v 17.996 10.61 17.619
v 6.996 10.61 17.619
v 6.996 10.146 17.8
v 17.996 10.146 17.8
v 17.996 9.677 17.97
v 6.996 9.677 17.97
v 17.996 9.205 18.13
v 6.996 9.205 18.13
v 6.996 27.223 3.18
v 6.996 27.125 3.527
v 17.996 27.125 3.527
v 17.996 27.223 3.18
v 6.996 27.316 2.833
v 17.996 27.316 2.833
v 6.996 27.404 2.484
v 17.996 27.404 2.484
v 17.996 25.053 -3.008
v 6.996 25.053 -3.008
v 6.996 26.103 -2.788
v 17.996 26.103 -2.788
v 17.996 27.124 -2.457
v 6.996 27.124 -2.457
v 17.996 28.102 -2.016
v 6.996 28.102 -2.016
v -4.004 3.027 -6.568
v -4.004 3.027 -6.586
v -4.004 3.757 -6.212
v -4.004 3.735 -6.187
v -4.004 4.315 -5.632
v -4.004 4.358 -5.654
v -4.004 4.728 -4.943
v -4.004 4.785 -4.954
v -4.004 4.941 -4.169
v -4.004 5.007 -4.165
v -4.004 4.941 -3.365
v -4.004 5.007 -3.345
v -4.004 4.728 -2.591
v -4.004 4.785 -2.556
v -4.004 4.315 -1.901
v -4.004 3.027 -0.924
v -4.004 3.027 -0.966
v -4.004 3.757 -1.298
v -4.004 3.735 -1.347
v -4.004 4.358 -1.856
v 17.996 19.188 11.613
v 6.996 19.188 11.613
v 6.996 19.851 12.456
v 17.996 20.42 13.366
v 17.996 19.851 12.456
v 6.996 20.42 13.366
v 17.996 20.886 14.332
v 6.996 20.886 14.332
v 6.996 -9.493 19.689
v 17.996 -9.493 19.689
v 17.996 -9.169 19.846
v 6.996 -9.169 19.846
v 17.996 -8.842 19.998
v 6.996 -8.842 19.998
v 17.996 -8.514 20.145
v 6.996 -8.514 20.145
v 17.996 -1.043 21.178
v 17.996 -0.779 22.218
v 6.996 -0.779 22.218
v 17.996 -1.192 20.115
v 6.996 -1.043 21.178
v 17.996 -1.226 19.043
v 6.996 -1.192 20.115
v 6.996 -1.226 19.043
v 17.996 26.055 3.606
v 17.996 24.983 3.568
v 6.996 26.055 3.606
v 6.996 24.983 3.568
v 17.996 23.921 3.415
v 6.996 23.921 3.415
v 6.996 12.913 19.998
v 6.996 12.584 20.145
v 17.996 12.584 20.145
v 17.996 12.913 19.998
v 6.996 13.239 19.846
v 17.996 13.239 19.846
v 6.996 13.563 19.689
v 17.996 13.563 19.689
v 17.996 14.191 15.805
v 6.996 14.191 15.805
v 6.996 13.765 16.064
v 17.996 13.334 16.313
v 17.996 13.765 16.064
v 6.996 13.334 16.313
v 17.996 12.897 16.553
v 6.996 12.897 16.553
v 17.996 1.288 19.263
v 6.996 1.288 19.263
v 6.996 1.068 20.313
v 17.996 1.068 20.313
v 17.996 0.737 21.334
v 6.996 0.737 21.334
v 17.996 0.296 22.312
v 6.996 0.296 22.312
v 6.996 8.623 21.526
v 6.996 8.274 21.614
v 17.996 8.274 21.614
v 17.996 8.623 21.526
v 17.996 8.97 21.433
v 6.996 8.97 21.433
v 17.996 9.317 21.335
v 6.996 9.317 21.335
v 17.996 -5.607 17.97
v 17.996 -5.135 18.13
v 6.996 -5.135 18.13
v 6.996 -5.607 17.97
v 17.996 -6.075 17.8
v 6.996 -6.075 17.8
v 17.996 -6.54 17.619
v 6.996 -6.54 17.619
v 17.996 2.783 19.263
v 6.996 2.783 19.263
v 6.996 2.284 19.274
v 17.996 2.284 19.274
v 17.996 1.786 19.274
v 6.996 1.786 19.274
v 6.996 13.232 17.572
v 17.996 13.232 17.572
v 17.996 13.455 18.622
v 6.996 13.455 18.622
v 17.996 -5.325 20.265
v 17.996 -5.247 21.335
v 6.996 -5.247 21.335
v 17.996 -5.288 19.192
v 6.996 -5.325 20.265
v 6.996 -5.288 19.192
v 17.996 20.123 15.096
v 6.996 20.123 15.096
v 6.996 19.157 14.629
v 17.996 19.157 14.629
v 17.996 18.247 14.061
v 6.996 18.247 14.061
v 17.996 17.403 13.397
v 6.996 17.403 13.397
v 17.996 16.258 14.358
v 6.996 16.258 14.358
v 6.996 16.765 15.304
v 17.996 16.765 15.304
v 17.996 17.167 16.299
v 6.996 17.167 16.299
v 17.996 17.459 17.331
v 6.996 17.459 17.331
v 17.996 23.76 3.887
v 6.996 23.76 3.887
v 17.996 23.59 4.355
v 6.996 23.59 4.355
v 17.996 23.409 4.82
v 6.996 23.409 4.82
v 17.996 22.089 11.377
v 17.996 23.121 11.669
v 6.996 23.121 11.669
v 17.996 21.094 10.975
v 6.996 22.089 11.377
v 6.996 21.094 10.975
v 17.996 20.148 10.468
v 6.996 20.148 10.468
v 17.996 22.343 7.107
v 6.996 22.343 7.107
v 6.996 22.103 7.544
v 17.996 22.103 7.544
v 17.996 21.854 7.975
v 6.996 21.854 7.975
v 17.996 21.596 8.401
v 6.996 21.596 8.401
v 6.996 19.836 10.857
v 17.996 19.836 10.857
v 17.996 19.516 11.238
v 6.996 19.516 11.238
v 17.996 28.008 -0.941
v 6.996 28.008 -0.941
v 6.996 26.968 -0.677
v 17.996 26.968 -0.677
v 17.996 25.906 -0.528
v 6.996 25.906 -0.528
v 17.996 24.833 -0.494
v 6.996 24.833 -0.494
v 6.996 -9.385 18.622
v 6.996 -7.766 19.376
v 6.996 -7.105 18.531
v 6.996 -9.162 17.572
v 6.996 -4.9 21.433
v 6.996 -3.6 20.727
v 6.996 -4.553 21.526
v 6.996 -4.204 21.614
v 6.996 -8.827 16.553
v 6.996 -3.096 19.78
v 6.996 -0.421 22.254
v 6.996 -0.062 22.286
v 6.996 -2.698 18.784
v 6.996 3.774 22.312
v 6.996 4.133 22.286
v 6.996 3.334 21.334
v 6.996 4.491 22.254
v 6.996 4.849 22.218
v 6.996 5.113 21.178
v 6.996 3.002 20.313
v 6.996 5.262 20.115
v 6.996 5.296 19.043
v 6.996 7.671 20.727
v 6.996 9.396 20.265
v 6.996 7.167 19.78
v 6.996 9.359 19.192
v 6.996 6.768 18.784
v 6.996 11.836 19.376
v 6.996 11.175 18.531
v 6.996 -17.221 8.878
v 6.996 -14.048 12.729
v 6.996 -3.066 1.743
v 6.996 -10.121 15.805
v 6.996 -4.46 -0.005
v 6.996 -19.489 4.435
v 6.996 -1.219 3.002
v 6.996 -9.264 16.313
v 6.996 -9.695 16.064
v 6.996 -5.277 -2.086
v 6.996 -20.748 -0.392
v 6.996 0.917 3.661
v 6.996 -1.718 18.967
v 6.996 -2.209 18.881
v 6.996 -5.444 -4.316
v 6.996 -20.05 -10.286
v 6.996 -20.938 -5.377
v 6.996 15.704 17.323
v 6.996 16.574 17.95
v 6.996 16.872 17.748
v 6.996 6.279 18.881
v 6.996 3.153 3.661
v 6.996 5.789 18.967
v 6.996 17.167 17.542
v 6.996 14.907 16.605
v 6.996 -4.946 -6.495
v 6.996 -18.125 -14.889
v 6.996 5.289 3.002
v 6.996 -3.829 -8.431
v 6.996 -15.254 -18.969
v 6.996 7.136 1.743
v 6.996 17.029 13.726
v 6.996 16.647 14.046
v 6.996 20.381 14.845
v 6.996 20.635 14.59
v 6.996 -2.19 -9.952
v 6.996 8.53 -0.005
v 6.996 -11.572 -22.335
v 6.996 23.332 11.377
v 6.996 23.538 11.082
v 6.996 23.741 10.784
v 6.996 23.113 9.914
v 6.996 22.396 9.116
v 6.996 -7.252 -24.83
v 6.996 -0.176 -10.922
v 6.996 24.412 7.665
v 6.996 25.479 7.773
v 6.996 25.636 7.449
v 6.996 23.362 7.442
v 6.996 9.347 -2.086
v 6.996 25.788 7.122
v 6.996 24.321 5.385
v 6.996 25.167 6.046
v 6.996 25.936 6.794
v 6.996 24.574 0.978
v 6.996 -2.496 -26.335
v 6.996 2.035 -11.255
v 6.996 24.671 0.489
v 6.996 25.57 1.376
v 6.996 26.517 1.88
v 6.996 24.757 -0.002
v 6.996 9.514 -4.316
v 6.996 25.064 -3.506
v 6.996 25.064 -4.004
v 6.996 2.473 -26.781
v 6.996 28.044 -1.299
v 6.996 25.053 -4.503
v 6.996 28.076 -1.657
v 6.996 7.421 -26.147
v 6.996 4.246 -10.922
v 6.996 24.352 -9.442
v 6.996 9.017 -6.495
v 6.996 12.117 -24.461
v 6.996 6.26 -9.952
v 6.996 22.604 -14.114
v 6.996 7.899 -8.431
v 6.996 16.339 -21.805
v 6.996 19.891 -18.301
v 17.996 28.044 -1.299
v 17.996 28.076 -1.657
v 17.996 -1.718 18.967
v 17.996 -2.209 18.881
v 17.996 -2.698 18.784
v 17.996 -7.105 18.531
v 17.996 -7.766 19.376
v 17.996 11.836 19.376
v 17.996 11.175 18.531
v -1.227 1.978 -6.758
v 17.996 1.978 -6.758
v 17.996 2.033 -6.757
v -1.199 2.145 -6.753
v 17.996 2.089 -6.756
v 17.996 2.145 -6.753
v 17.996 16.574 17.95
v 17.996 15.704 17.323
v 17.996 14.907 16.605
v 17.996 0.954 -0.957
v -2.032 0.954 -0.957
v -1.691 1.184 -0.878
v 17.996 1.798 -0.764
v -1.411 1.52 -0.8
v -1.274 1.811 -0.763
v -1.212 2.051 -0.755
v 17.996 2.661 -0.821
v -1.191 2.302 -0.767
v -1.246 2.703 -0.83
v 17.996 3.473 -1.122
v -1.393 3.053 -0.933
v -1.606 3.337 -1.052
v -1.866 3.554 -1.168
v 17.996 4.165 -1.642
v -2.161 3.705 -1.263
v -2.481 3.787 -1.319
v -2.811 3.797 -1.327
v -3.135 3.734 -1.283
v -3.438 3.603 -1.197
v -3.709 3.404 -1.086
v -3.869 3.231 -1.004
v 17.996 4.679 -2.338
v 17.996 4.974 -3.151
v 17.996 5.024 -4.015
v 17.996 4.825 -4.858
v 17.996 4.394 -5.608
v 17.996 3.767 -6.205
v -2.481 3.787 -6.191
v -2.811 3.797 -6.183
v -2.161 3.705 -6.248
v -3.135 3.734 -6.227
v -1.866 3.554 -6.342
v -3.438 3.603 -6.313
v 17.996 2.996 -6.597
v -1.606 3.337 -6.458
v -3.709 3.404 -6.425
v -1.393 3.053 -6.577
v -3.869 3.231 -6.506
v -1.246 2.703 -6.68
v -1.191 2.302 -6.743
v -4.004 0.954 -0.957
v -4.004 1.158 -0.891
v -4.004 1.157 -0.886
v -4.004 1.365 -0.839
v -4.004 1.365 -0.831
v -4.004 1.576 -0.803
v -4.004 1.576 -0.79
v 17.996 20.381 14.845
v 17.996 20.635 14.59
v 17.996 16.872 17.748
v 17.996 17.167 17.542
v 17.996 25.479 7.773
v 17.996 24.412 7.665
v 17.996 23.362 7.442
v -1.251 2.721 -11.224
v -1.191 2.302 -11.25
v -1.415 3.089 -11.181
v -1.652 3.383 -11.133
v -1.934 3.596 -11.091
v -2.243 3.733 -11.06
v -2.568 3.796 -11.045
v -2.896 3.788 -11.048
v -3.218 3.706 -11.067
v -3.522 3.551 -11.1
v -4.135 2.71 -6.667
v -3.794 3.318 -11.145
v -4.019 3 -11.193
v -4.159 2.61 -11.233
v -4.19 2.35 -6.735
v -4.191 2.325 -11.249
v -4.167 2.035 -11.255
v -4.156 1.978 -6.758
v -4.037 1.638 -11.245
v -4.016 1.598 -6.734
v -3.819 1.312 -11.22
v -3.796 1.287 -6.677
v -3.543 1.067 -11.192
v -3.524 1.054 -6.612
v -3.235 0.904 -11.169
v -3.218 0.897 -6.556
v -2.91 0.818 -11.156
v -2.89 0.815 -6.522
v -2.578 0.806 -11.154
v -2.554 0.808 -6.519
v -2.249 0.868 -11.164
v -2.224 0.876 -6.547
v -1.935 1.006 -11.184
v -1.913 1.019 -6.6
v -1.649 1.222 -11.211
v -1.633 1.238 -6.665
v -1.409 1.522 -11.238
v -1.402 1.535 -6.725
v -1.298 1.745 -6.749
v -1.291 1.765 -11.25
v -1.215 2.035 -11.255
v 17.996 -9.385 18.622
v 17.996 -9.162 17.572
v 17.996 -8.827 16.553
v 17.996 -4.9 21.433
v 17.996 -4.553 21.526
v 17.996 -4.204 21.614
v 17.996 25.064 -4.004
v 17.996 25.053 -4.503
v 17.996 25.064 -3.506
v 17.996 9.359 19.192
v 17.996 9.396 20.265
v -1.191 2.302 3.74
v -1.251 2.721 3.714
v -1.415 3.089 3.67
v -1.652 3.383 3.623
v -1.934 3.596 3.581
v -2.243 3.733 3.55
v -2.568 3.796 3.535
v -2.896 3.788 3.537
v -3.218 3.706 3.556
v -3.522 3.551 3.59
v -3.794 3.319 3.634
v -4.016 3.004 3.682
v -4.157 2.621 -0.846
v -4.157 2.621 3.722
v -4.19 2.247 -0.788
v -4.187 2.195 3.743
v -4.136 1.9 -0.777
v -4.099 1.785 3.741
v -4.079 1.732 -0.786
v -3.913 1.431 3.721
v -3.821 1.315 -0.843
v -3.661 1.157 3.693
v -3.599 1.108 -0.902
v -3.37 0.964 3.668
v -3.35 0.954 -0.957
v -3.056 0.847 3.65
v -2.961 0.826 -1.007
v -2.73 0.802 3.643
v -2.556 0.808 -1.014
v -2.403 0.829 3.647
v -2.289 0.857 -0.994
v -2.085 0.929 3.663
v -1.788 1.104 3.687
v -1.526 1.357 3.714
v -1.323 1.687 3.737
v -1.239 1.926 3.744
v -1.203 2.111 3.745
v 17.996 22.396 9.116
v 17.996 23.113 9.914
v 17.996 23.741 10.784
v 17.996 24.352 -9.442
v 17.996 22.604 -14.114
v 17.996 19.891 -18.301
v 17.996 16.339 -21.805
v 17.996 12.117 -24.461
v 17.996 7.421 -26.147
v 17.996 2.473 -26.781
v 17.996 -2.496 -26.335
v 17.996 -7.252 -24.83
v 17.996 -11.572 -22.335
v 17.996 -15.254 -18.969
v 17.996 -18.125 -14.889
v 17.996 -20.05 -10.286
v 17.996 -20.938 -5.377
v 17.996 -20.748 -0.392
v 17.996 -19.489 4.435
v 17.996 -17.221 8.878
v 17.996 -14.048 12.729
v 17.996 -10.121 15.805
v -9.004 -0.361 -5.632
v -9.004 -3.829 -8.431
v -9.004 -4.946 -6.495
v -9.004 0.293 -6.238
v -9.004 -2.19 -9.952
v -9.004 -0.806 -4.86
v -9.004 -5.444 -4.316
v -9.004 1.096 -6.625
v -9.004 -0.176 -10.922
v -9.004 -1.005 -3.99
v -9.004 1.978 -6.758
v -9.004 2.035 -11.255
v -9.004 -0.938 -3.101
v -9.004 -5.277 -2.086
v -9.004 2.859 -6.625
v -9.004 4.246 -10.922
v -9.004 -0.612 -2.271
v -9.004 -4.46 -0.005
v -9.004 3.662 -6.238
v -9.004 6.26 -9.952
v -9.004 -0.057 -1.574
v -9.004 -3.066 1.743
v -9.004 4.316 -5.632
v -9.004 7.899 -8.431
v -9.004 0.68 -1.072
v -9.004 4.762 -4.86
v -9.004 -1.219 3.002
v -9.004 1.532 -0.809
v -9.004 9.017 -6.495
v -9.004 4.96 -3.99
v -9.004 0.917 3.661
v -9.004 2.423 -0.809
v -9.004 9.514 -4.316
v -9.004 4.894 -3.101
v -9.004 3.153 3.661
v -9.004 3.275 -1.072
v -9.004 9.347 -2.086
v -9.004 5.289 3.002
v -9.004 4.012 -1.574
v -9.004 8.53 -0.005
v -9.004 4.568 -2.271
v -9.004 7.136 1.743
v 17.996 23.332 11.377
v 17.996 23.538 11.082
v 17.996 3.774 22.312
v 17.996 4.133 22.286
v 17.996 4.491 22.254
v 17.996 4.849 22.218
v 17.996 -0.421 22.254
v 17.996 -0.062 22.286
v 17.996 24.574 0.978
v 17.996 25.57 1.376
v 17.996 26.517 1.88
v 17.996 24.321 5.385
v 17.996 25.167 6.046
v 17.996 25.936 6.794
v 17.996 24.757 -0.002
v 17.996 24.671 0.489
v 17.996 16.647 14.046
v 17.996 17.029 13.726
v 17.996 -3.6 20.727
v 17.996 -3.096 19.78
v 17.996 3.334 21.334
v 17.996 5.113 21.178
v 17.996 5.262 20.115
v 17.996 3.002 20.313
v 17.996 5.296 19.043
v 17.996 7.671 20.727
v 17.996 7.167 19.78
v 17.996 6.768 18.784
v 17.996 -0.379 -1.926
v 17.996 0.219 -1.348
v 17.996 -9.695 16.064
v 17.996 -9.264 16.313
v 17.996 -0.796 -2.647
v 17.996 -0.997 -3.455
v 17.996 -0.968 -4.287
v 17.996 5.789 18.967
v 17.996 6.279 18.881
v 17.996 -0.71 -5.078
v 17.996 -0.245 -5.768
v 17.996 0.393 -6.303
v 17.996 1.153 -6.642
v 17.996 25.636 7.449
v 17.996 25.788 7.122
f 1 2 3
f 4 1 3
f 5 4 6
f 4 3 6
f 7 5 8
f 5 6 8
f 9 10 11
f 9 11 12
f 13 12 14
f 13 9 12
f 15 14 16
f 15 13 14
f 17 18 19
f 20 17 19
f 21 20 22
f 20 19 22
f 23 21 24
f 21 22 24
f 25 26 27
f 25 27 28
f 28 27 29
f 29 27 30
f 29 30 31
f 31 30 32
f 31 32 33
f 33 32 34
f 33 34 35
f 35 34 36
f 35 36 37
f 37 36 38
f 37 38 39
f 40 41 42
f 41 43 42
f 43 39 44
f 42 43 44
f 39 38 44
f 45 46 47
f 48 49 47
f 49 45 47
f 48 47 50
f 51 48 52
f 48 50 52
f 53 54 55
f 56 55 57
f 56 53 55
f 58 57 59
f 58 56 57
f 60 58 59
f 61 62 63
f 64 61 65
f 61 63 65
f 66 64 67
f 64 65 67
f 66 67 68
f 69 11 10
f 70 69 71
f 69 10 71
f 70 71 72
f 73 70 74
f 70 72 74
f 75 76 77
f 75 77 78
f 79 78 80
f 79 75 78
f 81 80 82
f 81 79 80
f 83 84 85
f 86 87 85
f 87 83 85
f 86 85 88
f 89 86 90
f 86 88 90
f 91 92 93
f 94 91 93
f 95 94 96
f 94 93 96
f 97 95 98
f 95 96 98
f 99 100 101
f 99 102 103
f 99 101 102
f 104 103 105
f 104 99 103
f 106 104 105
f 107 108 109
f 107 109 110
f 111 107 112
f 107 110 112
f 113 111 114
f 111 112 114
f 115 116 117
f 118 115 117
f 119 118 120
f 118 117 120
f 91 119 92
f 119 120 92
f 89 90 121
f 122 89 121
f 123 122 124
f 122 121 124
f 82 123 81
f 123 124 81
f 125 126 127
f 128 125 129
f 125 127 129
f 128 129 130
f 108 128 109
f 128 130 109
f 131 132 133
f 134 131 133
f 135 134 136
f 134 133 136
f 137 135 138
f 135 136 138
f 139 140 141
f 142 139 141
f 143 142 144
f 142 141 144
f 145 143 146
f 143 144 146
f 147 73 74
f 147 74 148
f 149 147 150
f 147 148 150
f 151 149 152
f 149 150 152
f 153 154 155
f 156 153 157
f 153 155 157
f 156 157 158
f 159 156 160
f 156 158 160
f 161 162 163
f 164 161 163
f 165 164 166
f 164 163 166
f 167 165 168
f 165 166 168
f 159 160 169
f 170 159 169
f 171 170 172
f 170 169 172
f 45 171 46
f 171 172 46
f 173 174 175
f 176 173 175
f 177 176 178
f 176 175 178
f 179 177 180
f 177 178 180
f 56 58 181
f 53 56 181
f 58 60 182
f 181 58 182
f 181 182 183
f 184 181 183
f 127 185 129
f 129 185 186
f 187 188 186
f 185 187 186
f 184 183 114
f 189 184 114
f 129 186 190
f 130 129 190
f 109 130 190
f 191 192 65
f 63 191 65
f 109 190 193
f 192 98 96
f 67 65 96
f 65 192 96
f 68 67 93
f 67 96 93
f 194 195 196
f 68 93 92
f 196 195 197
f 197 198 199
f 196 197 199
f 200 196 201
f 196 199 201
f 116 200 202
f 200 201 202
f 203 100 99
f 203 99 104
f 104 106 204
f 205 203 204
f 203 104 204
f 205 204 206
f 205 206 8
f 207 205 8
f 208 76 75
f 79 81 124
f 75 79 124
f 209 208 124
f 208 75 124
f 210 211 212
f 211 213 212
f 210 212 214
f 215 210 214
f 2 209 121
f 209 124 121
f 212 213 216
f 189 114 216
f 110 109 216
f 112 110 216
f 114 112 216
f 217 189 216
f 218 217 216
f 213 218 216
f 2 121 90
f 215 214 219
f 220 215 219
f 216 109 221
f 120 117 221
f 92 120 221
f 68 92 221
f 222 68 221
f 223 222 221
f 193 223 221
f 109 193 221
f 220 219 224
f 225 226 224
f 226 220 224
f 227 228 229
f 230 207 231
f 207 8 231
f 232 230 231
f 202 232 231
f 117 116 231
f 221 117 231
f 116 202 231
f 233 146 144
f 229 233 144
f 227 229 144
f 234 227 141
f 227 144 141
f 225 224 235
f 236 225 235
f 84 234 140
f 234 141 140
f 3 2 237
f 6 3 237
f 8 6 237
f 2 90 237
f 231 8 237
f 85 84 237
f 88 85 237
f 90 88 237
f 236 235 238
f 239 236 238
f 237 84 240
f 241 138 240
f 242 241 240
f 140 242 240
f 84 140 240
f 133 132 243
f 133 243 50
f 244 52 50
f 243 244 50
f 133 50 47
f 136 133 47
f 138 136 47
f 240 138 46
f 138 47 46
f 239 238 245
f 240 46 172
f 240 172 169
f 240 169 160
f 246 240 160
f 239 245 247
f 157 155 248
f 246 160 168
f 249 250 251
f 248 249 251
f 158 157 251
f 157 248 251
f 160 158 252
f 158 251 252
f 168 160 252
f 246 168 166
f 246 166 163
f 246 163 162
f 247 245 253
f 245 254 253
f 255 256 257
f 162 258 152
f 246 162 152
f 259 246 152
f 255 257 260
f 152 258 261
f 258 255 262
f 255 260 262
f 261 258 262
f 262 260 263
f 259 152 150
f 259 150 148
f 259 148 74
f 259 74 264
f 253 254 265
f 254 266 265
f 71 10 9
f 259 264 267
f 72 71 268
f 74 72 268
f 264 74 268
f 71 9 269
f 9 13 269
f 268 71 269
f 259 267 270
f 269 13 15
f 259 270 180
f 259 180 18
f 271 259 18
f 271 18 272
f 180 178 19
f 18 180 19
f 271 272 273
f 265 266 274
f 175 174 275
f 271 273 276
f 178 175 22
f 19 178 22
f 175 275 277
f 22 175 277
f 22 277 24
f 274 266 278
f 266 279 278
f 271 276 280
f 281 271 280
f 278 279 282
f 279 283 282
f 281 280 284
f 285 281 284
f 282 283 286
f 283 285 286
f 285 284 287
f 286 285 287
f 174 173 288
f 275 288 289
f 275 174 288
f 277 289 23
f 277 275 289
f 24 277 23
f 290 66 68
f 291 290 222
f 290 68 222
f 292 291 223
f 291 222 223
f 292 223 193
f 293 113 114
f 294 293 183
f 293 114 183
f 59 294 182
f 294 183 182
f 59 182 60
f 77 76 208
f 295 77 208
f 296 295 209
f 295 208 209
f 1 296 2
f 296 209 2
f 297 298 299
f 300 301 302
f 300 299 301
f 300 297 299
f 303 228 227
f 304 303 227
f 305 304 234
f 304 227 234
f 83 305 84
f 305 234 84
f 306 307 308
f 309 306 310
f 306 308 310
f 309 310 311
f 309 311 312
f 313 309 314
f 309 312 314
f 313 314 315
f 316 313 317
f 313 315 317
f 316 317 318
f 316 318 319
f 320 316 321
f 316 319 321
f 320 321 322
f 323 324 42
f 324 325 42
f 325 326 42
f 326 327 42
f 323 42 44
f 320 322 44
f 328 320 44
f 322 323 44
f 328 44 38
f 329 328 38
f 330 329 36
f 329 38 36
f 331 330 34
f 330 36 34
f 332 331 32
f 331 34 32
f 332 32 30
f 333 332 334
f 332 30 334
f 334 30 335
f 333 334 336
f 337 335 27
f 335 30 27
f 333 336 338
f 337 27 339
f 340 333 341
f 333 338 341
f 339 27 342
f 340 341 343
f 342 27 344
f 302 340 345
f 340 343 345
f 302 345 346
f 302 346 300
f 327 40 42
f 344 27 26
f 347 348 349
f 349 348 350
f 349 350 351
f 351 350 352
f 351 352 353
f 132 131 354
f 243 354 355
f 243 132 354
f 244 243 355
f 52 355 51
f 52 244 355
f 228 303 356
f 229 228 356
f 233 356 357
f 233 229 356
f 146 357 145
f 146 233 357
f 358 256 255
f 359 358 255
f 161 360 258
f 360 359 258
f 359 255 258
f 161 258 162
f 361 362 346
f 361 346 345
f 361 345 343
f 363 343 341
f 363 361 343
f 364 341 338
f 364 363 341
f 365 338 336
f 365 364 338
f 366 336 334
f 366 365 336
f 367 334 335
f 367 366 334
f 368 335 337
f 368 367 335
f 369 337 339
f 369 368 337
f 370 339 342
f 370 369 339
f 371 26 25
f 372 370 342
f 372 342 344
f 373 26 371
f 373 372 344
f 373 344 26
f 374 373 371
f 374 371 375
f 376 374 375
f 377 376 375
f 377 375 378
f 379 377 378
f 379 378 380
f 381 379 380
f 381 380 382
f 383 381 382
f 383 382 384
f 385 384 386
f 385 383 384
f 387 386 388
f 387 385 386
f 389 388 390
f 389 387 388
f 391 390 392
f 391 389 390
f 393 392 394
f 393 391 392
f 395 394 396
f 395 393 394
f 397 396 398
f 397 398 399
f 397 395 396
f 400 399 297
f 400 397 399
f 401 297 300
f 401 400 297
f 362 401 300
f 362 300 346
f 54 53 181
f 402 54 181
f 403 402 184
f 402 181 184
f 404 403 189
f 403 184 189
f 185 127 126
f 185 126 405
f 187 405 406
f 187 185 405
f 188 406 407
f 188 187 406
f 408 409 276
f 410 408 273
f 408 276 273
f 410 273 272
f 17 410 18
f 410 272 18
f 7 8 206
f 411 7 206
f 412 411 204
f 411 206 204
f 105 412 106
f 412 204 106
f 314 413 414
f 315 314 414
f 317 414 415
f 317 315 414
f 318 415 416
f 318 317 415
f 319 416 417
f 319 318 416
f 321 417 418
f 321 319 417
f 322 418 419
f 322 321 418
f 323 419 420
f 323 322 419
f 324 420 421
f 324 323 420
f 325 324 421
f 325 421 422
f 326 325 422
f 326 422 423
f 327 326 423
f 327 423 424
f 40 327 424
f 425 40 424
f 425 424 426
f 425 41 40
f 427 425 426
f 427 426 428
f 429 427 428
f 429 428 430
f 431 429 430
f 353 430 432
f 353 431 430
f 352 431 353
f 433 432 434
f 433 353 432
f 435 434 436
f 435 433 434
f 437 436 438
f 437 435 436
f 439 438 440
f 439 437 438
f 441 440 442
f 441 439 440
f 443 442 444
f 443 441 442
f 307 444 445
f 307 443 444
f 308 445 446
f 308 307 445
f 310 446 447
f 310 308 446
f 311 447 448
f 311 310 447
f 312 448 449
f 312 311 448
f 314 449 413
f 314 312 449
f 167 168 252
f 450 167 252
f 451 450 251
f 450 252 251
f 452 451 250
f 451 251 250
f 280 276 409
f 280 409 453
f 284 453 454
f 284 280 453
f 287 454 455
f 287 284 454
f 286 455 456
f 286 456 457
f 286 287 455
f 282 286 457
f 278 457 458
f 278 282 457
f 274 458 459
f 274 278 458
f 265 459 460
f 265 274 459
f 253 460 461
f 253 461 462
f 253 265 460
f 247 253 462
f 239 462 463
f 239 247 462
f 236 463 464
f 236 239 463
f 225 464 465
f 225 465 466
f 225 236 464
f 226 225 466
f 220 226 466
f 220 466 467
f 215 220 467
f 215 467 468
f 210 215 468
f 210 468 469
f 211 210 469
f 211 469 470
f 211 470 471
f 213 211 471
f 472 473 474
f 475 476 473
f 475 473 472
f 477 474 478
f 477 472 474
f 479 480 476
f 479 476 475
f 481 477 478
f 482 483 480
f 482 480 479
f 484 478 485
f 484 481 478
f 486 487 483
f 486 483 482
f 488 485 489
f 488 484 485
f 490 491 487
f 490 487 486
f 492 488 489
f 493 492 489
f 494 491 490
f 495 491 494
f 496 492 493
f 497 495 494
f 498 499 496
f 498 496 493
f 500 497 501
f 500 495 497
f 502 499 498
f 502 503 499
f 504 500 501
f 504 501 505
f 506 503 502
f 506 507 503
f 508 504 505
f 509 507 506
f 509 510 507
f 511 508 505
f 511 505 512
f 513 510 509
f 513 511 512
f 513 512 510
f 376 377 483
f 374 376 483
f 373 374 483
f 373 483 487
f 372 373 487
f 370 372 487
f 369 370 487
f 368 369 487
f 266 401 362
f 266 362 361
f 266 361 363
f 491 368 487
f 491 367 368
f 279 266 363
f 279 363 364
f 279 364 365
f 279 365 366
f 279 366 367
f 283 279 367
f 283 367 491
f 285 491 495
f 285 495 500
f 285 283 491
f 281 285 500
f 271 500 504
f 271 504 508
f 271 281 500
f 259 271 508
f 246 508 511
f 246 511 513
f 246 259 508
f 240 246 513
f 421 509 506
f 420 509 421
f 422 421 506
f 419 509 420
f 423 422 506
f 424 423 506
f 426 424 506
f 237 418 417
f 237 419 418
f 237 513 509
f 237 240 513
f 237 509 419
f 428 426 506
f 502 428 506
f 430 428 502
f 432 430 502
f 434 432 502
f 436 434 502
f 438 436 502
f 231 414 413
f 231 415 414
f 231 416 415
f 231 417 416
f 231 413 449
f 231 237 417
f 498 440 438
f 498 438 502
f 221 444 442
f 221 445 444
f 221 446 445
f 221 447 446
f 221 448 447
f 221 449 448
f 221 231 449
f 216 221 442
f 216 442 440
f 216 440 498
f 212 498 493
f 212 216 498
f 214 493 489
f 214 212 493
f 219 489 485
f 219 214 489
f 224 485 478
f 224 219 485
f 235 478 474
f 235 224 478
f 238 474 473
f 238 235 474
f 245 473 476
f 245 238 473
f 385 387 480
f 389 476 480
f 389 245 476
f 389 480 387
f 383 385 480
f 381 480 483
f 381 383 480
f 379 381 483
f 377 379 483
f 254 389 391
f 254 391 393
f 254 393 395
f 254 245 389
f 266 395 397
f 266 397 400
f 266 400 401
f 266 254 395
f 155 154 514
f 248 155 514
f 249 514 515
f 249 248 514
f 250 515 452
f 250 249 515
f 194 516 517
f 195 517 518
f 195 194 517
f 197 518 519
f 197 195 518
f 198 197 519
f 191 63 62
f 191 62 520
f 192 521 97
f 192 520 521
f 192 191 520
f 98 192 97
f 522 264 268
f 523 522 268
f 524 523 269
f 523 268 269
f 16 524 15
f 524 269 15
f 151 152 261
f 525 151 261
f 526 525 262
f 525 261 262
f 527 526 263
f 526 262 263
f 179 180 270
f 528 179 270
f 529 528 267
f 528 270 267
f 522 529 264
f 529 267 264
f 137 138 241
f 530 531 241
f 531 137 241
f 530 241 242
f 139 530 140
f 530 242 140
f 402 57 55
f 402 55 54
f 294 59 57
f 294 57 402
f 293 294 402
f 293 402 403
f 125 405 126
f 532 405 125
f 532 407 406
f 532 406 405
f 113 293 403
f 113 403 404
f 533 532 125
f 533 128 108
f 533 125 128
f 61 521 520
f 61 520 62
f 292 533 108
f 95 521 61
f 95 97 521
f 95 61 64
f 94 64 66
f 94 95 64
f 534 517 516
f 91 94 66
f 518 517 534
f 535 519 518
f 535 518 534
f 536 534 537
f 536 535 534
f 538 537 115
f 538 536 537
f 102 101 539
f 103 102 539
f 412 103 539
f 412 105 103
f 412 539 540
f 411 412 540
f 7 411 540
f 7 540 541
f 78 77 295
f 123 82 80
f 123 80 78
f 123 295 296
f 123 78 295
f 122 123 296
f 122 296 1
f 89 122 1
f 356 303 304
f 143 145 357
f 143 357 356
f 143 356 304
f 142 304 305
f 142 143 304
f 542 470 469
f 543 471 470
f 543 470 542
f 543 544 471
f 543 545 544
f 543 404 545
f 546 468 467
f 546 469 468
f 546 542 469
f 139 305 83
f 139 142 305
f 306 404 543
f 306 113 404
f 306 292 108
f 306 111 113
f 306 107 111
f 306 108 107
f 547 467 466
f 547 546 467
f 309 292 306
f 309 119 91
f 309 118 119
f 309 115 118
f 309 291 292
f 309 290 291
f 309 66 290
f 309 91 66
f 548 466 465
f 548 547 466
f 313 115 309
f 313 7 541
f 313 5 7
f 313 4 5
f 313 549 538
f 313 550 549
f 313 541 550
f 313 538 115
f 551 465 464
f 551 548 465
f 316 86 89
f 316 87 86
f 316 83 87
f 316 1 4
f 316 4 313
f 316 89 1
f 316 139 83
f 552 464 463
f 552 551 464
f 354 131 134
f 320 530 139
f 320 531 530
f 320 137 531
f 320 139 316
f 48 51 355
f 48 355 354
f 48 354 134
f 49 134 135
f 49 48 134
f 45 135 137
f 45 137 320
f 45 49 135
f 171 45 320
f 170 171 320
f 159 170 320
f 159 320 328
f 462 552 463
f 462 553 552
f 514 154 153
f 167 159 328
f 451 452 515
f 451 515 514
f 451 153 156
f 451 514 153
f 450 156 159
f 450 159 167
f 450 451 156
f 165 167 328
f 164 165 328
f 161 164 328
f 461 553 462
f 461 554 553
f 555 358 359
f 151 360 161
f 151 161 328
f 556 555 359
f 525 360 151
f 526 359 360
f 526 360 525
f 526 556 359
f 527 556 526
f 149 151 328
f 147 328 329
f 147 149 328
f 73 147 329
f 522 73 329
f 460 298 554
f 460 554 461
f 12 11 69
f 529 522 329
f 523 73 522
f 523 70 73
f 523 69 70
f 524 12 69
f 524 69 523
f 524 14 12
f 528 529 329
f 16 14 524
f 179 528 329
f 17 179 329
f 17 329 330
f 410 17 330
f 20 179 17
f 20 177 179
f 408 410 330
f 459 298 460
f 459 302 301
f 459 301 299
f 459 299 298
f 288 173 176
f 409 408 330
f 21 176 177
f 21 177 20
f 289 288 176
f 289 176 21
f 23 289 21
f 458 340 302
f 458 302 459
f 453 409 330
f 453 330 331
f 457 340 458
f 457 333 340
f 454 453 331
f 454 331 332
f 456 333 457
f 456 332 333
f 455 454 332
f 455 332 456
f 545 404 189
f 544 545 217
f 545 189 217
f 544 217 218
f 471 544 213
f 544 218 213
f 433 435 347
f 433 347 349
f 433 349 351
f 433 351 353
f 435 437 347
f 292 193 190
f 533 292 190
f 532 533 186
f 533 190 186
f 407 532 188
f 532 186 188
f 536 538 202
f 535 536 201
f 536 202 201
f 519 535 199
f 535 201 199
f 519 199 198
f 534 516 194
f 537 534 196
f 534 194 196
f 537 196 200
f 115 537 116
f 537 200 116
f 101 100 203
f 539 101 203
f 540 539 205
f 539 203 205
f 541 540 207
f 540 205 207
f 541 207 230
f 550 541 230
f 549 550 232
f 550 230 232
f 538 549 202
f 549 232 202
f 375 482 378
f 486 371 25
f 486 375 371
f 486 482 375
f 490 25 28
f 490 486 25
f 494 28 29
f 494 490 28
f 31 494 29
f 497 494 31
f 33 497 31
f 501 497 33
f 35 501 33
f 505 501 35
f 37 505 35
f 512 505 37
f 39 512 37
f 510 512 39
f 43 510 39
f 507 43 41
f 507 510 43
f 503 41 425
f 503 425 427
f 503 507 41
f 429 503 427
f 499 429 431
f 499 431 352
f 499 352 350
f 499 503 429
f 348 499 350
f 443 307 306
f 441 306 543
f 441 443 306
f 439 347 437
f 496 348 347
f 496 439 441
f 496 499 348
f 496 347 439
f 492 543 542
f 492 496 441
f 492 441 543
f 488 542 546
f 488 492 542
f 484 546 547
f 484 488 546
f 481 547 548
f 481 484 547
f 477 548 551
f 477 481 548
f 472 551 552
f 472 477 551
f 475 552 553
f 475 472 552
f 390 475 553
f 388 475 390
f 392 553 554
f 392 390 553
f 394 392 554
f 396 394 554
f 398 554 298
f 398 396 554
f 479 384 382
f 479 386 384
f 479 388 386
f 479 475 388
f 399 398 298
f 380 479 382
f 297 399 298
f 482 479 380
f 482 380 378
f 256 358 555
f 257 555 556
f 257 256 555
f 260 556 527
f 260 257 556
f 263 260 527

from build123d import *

# Parameters (mm, degrees)
SKETCH1_W                    = 11
SKETCH1_H                    = 26.125
CUT_EXTRUDE1_DEPTH           = 43.506639989
CUT_EXTRUDE2_DEPTH           = 43.506639989
CUT_EXTRUDE3_DEPTH           = 43.506639989
CUT_EXTRUDE4_DEPTH           = 43.506639989
CUT_EXTRUDE5_DEPTH           = 43.506639989
CUT_EXTRUDE6_DEPTH           = 43.506639989
CUT_EXTRUDE7_DEPTH           = 43.506639989
CUT_EXTRUDE8_DEPTH           = 43.506639989
CUT_EXTRUDE9_DEPTH           = 43.506639989
CUT_EXTRUDE10_DEPTH          = 43.506639989
CUT_EXTRUDE11_DEPTH          = 43.468291129
CUT_EXTRUDE12_DEPTH          = 43.468291129
CUT_EXTRUDE13_DEPTH          = 43.468291129
SKETCH15_W                   = 16.0000508
SKETCH15_H                   = 7.5
F_6_0_6_DIAMETER_HOLE1_D     = 6
F_6_0_6_DIAMETER_HOLE1_DEPTH = 22.0000508
CUT_EXTRUDE14_DEPTH          = 45.792969961
CUT_EXTRUDE14_DEPTH_BACK     = 45.792969961
SKETCH22_R                   = 2.990861642
CUT_EXTRUDE15_DEPTH          = 45.792969961
CUT_EXTRUDE15_DEPTH_BACK     = 45.792969961
SKETCH23_R                   = 1.5
SPLIT1_START                 = 6.995955282
SPLIT1_DEPTH                 = 11


# Read off the part's stored shape, not the designer's step: Split1
with BuildPart() as part:
    # Sketch1 → Revolve1 (revolve)
    with BuildSketch(Plane(origin=(0, 0, -3.755095368), x_dir=(-1, 0, 0), z_dir=(0, 0, -1)), mode=Mode.PRIVATE) as revolve1_sk:
        with Locations((-12.495955282, 15.097655255)):
            Rectangle(SKETCH1_W, SKETCH1_H)
    revolve(revolve1_sk.sketch.rotate(Axis((17.995955282, 2.035155255, -3.755095368), (-1, 0, 0)), 270), axis=Axis((17.995955282, 2.035155255, -3.755095368), (-1, 0, 0)))

    # Sketch2 → Cut-Extrude1 (cut, through all)
    with BuildSketch(Plane.ZY.offset(-6.995955282)):
        with BuildLine():
            ThreePointArc((14.332392383, 20.8861078), (13.037730936, 22.048066331), (11.668609565, 23.121286981))
            ThreePointArc((11.668609565, 23.121286981), (11.189500109, 21.585967652), (10.468111889, 20.148487096))
            ThreePointArc((10.468111889, 20.148487096), (11.04846398, 19.677350291), (11.613220242, 19.187627099))
            ThreePointArc((11.613220242, 19.187627099), (12.903594489, 20.14767169), (14.332392383, 20.8861078))
        make_face()
    extrude(amount=-CUT_EXTRUDE1_DEPTH, mode=Mode.SUBTRACT)

    # Sketch3 → Cut-Extrude2 (cut, through all)
    with BuildSketch(Plane.ZY.offset(-6.995955282)):
        with BuildLine():
            ThreePointArc((17.331036359, 17.458860187), (16.257815709, 18.827981558), (15.095857178, 20.122643005))
            ThreePointArc((15.095857178, 20.122643005), (14.357421068, 18.693845111), (13.397376477, 17.403470864))
            ThreePointArc((13.397376477, 17.403470864), (13.887099669, 16.838714603), (14.358236474, 16.258362511))
            ThreePointArc((14.358236474, 16.258362511), (15.79571703, 16.979750731), (17.331036359, 17.458860187))
        make_face()
    extrude(amount=-CUT_EXTRUDE2_DEPTH, mode=Mode.SUBTRACT)

    # Sketch4 → Cut-Extrude3 (cut, through all)
    with BuildSketch(Plane.ZY.offset(-6.995955282)):
        with BuildLine():
            ThreePointArc((19.688988892, 13.562971103), (18.869818306, 15.097655255), (17.950328137, 16.574419867))
            ThreePointArc((17.950328137, 16.574419867), (16.97500238, 15.295556708), (15.805471888, 14.191496139))
            ThreePointArc((15.805471888, 14.191496139), (16.189686188, 13.550280255), (16.552888283, 12.896932968))
            ThreePointArc((16.552888283, 12.896932968), (18.093798029, 13.3577458), (19.688988892, 13.562971103))
        make_face()
    extrude(amount=-CUT_EXTRUDE3_DEPTH, mode=Mode.SUBTRACT)

    # Sketch5 → Cut-Extrude4 (cut, through all)
    with BuildSketch(Plane.ZY.offset(-6.995955282)):
        with BuildLine():
            ThreePointArc((21.334604788, 9.316815169), (20.794374351, 10.970431499), (20.145290787, 12.584428531))
            ThreePointArc((20.145290787, 12.584428531), (18.962710163, 11.494357717), (17.619229361, 10.610157148))
            ThreePointArc((17.619229361, 10.610157148), (17.886260612, 9.91196466), (18.130492286, 9.205473805))
            ThreePointArc((18.130492286, 9.205473805), (19.728011459, 9.391709686), (21.334604788, 9.316815169))
        make_face()
    extrude(amount=-CUT_EXTRUDE4_DEPTH, mode=Mode.SUBTRACT)

    # Sketch6 → Cut-Extrude5 (cut, through all)
    with BuildSketch(Plane.ZY.offset(-6.995955282)):
        with BuildLine():
            ThreePointArc((22.217882841, 4.849409683), (21.97300718, 6.571713896), (21.614052298, 8.273902864))
            ThreePointArc((21.614052298, 8.273902864), (20.26014892, 7.405745646), (18.783538793, 6.768271063))
            ThreePointArc((18.783538793, 6.768271063), (18.925273386, 6.034316198), (19.043113783, 5.296148141))
            ThreePointArc((19.043113783, 5.296148141), (20.648702571, 5.202148388), (22.217882841, 4.849409683))
        make_face()
    extrude(amount=-CUT_EXTRUDE5_DEPTH, mode=Mode.SUBTRACT)

    # Sketch7 → Cut-Extrude6 (cut, through all)
    with BuildSketch(Plane.ZY.offset(-6.995955282)):
        with BuildLine():
            ThreePointArc((22.311985094, 0.2964945), (22.369904632, 2.035155255), (22.311985094, 3.773816009))
            ThreePointArc((22.311985094, 3.773816009), (20.827896632, 3.153950904), (19.263023231, 2.78257165))
            ThreePointArc((19.263023231, 2.78257165), (19.275154632, 2.035155255), (19.263023231, 1.287738859))
            ThreePointArc((19.263023231, 1.287738859), (20.827896632, 0.916359605), (22.311985094, 0.2964945))
        make_face()
    extrude(amount=-CUT_EXTRUDE6_DEPTH, mode=Mode.SUBTRACT)

    # Sketch8 → Cut-Extrude7 (cut, through all)
    with BuildSketch(Plane.ZY.offset(-6.995955282)):
        with BuildLine():
            ThreePointArc((21.614052298, -4.203592355), (21.97300718, -2.501403387), (22.217882841, -0.779099174))
            ThreePointArc((22.217882841, -0.779099174), (20.648702571, -1.131837878), (19.043113783, -1.225837632))
            ThreePointArc((19.043113783, -1.225837632), (18.925273386, -1.964005689), (18.783538793, -2.697960554))
            ThreePointArc((18.783538793, -2.697960554), (20.26014892, -3.335435137), (21.614052298, -4.203592355))
        make_face()
    extrude(amount=-CUT_EXTRUDE7_DEPTH, mode=Mode.SUBTRACT)

    # Sketch9 → Cut-Extrude8 (cut, through all)
    with BuildSketch(Plane.ZY.offset(-6.995955282)):
        with BuildLine():
            ThreePointArc((20.145290787, -8.514118022), (20.794374351, -6.90012099), (21.334604788, -5.24650466))
            ThreePointArc((21.334604788, -5.24650466), (19.728011459, -5.321399177), (18.130492286, -5.135163296))
            ThreePointArc((18.130492286, -5.135163296), (17.886260612, -5.841654151), (17.619229361, -6.539846639))
            ThreePointArc((17.619229361, -6.539846639), (18.962710163, -7.424047208), (20.145290787, -8.514118022))
        make_face()
    extrude(amount=-CUT_EXTRUDE8_DEPTH, mode=Mode.SUBTRACT)

    # Sketch10 → Cut-Extrude9 (cut, through all)
    with BuildSketch(Plane.ZY.offset(-6.995955282)):
        with BuildLine():
            ThreePointArc((17.950328137, -12.504109358), (18.869818306, -11.027344745), (19.688988892, -9.492660594))
            ThreePointArc((19.688988892, -9.492660594), (18.093798029, -9.287435291), (16.552888283, -8.826622459))
            ThreePointArc((16.552888283, -8.826622459), (16.189686188, -9.479969745), (15.805471888, -10.12118563))
            ThreePointArc((15.805471888, -10.12118563), (16.97500238, -11.225246199), (17.950328137, -12.504109358))
        make_face()
    extrude(amount=-CUT_EXTRUDE9_DEPTH, mode=Mode.SUBTRACT)

    # Sketch11 → Cut-Extrude10 (cut, through all)
    with BuildSketch(Plane.ZY.offset(-6.995955282)):
        with BuildLine():
            ThreePointArc((-2.016434613, 28.102235716), (-3.755095368, 28.160155255), (-5.493756122, 28.102235716))
            ThreePointArc((-5.493756122, 28.102235716), (-4.873891017, 26.618147254), (-4.502511763, 25.053273853))
            ThreePointArc((-4.502511763, 25.053273853), (-3.755095368, 25.065405255), (-3.007678972, 25.053273853))
            ThreePointArc((-3.007678972, 25.053273853), (-2.636299718, 26.618147254), (-2.016434613, 28.102235716))
        make_face()
    extrude(amount=-CUT_EXTRUDE10_DEPTH, mode=Mode.SUBTRACT)

    # Sketch12 → Cut-Extrude11 (cut, through all)
    with BuildSketch(Plane.ZY.offset(-6.995955282)):
        with BuildLine():
            ThreePointArc((2.483652242, 27.40430292), (0.781463274, 27.763257802), (-0.940840939, 28.008133463))
            ThreePointArc((-0.940840939, 28.008133463), (-0.588102235, 26.438953193), (-0.494102481, 24.833364405))
            ThreePointArc((-0.494102481, 24.833364405), (0.244065576, 24.715524008), (0.978020441, 24.573789415))
            ThreePointArc((0.978020441, 24.573789415), (1.615495024, 26.050399542), (2.483652242, 27.40430292))
        make_face()
    extrude(amount=-CUT_EXTRUDE11_DEPTH, mode=Mode.SUBTRACT)

    # Sketch13 → Cut-Extrude12 (cut, through all)
    with BuildSketch(Plane.ZY.offset(-6.995955282)):
        with BuildLine():
            ThreePointArc((6.794177909, 25.935541409), (5.180180877, 26.584624973), (3.526564547, 27.12485541))
            ThreePointArc((3.526564547, 27.12485541), (3.601459064, 25.518262081), (3.415223183, 23.920742908))
            ThreePointArc((3.415223183, 23.920742908), (4.121714038, 23.676511234), (4.819906526, 23.409479983))
            ThreePointArc((4.819906526, 23.409479983), (5.704107095, 24.752960785), (6.794177909, 25.935541409))
        make_face()
    extrude(amount=-CUT_EXTRUDE12_DEPTH, mode=Mode.SUBTRACT)

    # Sketch14 → Cut-Extrude13 (cut, through all)
    with BuildSketch(Plane.ZY.offset(-6.995955282)):
        with BuildLine():
            ThreePointArc((10.784169245, 23.740578759), (9.307404632, 24.660068928), (7.772720481, 25.479239514))
            ThreePointArc((7.772720481, 25.479239514), (7.567495178, 23.884048652), (7.106682346, 22.343138906))
            ThreePointArc((7.106682346, 22.343138906), (7.760029632, 21.97993681), (8.401245517, 21.59572251))
            ThreePointArc((8.401245517, 21.59572251), (9.505306086, 22.765253002), (10.784169245, 23.740578759))
        make_face()
    extrude(amount=-CUT_EXTRUDE13_DEPTH, mode=Mode.SUBTRACT)

    # Sketch15 → Revolve2 (revolve)
    with BuildSketch(Plane.XY.offset(-3.755095368), mode=Mode.PRIVATE) as revolve2_sk:
        with Locations((-1.004070118, 5.785155255)):
            Rectangle(SKETCH15_W, SKETCH15_H)
    revolve(revolve2_sk.sketch.rotate(Axis((-9.004095518, 2.035155255, -3.755095368), (1, 0, 0)), 270), axis=Axis((-9.004095518, 2.035155255, -3.755095368), (1, 0, 0)))

    # Ø6.0 (6) Diameter Hole1
    with Locations(Plane(origin=(17.995955282, 0, 0), x_dir=(0, 0, -1), z_dir=(1, 0, 0))):
        with Locations((3.755095368, 2.035155255)):
            Hole(F_6_0_6_DIAMETER_HOLE1_D / 2, depth=F_6_0_6_DIAMETER_HOLE1_DEPTH)

    # Sketch22 → Cut-Extrude14 (cut, two sides: drawn at the far end of the back side and taken through both)
    with BuildSketch(Plane(origin=(0, 0, 0), x_dir=(0, 0, -1), z_dir=(1, 0, 0)).offset(-CUT_EXTRUDE14_DEPTH_BACK)):
        with Locations((3.766902128, 1.977678158)):
            Circle(SKETCH22_R)
    extrude(amount=CUT_EXTRUDE14_DEPTH + CUT_EXTRUDE14_DEPTH_BACK, mode=Mode.SUBTRACT)

    # Sketch23 → Cut-Extrude15 (cut, two sides: drawn at the far end of the back side and taken through both)
    with BuildSketch(Plane.XY.offset(-CUT_EXTRUDE15_DEPTH_BACK)):
        with Locations((-2.691269596, 2.301526246)):
            Circle(SKETCH23_R)
    extrude(amount=CUT_EXTRUDE15_DEPTH + CUT_EXTRUDE15_DEPTH_BACK, mode=Mode.SUBTRACT)

    # Split1 outline → Split1 (cut)
    with BuildSketch(Plane.YZ.offset(SPLIT1_START)):
        with BuildLine():
            ThreePointArc((25.053273853, -4.502511763), (-9.479969745, -23.699876923), (-10.12118563, 15.805471888))
            ThreePointArc((-10.12118563, 15.805471888), (-11.225246199, 16.97500238), (-12.504109358, 17.950328137))
            ThreePointArc((-12.504109358, 17.950328137), (-11.027344745, -26.380009041), (28.102235716, -5.493756122))
            ThreePointArc((28.102235716, -5.493756122), (26.618147254, -4.873891017), (25.053273853, -4.502511763))
        make_face()
    extrude(amount=SPLIT1_DEPTH, mode=Mode.SUBTRACT)


solid = part.part
